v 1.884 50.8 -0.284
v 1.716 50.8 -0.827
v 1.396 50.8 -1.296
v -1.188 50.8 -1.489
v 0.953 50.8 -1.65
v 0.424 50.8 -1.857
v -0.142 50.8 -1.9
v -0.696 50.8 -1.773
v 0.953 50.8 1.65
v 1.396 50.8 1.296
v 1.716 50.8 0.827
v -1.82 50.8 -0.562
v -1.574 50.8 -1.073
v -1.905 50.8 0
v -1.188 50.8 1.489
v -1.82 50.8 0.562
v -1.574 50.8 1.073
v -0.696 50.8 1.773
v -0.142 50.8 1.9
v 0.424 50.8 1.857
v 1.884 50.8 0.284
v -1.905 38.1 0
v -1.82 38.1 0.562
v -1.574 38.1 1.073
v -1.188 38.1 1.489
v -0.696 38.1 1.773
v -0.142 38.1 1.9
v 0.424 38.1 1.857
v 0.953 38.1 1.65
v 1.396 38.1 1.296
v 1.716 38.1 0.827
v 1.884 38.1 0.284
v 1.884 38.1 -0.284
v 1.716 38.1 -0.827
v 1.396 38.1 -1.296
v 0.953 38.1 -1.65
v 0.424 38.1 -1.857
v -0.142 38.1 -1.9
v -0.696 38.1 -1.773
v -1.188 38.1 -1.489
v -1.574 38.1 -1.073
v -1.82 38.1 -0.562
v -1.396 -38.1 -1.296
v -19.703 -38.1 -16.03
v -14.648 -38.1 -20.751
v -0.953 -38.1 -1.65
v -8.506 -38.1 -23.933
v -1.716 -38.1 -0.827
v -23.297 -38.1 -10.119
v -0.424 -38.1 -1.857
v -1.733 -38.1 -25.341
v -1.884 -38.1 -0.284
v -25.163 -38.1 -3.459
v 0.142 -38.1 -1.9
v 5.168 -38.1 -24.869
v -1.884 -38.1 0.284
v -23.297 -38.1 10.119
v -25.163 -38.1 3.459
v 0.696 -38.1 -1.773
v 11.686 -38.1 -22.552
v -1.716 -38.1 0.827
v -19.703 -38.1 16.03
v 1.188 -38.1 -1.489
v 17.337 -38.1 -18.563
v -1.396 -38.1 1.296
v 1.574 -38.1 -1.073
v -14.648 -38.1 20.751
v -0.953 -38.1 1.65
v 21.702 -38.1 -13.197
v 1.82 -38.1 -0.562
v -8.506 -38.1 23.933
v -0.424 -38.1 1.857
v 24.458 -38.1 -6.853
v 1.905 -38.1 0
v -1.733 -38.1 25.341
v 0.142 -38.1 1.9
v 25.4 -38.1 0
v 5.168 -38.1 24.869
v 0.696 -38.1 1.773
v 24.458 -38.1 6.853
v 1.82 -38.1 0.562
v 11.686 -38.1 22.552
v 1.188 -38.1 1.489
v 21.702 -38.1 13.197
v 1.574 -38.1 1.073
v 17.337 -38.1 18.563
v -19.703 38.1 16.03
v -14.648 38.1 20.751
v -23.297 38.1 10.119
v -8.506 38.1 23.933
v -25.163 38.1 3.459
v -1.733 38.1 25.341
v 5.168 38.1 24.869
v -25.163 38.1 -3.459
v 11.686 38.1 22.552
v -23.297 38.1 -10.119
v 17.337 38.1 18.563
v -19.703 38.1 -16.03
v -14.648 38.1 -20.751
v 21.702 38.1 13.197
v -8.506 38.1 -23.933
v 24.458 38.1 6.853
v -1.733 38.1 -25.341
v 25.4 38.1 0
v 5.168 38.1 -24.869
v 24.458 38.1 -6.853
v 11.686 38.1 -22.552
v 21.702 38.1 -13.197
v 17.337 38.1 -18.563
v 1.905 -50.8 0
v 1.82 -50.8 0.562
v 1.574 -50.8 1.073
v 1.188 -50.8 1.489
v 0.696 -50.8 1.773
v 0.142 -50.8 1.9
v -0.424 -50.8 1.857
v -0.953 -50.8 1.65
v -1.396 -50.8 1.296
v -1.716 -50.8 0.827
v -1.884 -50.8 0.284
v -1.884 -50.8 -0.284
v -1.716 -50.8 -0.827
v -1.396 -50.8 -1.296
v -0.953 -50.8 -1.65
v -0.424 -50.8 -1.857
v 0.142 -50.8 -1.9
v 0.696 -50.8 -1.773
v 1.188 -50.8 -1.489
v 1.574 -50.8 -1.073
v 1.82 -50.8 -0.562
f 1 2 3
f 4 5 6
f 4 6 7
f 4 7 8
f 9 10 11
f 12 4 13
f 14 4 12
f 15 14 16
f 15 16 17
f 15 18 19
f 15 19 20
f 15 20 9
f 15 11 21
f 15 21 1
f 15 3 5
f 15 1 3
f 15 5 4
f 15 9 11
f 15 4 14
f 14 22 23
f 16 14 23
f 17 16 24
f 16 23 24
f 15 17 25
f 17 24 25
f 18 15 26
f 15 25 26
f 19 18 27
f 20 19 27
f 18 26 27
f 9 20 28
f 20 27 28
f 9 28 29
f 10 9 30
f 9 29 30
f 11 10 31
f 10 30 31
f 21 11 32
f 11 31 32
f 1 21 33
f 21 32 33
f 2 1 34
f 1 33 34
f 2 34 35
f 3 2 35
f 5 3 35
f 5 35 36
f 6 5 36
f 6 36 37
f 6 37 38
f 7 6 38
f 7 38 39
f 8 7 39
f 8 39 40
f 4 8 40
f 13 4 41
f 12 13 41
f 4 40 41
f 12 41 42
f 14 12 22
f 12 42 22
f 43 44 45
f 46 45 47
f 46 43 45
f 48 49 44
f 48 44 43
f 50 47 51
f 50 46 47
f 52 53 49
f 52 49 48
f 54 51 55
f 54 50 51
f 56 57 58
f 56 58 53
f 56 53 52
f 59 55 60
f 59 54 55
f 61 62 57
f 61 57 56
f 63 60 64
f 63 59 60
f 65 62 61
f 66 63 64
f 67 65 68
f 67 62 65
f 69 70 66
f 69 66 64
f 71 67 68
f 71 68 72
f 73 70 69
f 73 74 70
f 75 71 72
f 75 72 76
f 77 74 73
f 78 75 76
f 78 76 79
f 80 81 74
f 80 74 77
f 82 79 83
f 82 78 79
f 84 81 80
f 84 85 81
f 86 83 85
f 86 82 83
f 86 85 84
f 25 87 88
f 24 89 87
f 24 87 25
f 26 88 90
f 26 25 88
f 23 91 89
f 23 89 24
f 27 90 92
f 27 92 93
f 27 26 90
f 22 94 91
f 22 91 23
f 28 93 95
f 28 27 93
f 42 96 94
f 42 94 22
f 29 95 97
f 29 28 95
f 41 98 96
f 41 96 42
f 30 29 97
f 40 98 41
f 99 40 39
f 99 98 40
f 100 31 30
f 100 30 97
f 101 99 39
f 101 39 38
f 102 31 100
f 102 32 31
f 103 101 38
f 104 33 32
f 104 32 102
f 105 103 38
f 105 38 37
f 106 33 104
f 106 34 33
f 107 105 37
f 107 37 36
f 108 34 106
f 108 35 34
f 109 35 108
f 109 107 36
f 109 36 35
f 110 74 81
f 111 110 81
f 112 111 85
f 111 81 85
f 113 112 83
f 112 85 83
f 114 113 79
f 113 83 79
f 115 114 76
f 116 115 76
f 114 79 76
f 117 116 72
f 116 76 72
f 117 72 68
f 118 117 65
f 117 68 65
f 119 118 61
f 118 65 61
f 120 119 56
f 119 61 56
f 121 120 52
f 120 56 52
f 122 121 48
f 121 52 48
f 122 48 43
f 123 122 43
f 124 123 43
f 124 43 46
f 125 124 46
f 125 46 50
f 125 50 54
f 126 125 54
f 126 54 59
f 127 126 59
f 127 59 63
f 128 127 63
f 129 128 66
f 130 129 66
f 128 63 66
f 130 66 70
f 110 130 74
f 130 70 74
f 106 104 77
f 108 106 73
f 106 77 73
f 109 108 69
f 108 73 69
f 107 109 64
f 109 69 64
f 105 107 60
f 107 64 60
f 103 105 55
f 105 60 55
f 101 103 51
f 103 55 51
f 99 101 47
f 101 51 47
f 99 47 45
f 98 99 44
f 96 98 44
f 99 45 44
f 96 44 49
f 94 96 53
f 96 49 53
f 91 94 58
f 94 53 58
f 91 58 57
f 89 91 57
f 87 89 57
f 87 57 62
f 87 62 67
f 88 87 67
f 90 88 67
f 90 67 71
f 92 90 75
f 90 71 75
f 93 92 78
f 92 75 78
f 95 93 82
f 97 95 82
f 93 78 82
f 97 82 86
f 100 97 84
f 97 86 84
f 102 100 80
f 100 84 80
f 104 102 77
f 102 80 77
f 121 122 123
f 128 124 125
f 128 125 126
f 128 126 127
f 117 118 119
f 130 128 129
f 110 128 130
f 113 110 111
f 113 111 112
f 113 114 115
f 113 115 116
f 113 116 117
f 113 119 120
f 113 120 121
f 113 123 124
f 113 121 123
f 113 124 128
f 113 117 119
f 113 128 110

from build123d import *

# Parameters (mm, degrees)
F0_R      = 25.4
F1_DEPTH  = 38.1
F1_FACE_R = 25.4
F2_DEPTH  = 38.1
F4_R      = 1.905
F5_DEPTH  = 12.7
F3_R      = 1.905
F6_DEPTH  = 12.7


with BuildPart() as f1:
    # F0 (on Front) → F1 (new body)
    with BuildSketch(Plane.XZ):
        Circle(F0_R)
    extrude(amount=F1_DEPTH)

    # F1_face (on face) → F2 (join)
    with BuildSketch(Plane(origin=(0, 0, 0), x_dir=(1, 0, 0), z_dir=(0, 1, 0))):
        Circle(F1_FACE_R)
    extrude(amount=F2_DEPTH)

    # F4 (on face) → F5 (join)
    with BuildSketch(Plane(origin=(0, 38.1, 0), x_dir=(-1, 0, 0), z_dir=(0, 1, 0))):
        Circle(F4_R)
    extrude(amount=F5_DEPTH)

    # F3 (on face) → F6 (join)
    with BuildSketch(Plane.XZ.offset(38.1)):
        Circle(F3_R)
    extrude(amount=F6_DEPTH)


solid = f1.part
